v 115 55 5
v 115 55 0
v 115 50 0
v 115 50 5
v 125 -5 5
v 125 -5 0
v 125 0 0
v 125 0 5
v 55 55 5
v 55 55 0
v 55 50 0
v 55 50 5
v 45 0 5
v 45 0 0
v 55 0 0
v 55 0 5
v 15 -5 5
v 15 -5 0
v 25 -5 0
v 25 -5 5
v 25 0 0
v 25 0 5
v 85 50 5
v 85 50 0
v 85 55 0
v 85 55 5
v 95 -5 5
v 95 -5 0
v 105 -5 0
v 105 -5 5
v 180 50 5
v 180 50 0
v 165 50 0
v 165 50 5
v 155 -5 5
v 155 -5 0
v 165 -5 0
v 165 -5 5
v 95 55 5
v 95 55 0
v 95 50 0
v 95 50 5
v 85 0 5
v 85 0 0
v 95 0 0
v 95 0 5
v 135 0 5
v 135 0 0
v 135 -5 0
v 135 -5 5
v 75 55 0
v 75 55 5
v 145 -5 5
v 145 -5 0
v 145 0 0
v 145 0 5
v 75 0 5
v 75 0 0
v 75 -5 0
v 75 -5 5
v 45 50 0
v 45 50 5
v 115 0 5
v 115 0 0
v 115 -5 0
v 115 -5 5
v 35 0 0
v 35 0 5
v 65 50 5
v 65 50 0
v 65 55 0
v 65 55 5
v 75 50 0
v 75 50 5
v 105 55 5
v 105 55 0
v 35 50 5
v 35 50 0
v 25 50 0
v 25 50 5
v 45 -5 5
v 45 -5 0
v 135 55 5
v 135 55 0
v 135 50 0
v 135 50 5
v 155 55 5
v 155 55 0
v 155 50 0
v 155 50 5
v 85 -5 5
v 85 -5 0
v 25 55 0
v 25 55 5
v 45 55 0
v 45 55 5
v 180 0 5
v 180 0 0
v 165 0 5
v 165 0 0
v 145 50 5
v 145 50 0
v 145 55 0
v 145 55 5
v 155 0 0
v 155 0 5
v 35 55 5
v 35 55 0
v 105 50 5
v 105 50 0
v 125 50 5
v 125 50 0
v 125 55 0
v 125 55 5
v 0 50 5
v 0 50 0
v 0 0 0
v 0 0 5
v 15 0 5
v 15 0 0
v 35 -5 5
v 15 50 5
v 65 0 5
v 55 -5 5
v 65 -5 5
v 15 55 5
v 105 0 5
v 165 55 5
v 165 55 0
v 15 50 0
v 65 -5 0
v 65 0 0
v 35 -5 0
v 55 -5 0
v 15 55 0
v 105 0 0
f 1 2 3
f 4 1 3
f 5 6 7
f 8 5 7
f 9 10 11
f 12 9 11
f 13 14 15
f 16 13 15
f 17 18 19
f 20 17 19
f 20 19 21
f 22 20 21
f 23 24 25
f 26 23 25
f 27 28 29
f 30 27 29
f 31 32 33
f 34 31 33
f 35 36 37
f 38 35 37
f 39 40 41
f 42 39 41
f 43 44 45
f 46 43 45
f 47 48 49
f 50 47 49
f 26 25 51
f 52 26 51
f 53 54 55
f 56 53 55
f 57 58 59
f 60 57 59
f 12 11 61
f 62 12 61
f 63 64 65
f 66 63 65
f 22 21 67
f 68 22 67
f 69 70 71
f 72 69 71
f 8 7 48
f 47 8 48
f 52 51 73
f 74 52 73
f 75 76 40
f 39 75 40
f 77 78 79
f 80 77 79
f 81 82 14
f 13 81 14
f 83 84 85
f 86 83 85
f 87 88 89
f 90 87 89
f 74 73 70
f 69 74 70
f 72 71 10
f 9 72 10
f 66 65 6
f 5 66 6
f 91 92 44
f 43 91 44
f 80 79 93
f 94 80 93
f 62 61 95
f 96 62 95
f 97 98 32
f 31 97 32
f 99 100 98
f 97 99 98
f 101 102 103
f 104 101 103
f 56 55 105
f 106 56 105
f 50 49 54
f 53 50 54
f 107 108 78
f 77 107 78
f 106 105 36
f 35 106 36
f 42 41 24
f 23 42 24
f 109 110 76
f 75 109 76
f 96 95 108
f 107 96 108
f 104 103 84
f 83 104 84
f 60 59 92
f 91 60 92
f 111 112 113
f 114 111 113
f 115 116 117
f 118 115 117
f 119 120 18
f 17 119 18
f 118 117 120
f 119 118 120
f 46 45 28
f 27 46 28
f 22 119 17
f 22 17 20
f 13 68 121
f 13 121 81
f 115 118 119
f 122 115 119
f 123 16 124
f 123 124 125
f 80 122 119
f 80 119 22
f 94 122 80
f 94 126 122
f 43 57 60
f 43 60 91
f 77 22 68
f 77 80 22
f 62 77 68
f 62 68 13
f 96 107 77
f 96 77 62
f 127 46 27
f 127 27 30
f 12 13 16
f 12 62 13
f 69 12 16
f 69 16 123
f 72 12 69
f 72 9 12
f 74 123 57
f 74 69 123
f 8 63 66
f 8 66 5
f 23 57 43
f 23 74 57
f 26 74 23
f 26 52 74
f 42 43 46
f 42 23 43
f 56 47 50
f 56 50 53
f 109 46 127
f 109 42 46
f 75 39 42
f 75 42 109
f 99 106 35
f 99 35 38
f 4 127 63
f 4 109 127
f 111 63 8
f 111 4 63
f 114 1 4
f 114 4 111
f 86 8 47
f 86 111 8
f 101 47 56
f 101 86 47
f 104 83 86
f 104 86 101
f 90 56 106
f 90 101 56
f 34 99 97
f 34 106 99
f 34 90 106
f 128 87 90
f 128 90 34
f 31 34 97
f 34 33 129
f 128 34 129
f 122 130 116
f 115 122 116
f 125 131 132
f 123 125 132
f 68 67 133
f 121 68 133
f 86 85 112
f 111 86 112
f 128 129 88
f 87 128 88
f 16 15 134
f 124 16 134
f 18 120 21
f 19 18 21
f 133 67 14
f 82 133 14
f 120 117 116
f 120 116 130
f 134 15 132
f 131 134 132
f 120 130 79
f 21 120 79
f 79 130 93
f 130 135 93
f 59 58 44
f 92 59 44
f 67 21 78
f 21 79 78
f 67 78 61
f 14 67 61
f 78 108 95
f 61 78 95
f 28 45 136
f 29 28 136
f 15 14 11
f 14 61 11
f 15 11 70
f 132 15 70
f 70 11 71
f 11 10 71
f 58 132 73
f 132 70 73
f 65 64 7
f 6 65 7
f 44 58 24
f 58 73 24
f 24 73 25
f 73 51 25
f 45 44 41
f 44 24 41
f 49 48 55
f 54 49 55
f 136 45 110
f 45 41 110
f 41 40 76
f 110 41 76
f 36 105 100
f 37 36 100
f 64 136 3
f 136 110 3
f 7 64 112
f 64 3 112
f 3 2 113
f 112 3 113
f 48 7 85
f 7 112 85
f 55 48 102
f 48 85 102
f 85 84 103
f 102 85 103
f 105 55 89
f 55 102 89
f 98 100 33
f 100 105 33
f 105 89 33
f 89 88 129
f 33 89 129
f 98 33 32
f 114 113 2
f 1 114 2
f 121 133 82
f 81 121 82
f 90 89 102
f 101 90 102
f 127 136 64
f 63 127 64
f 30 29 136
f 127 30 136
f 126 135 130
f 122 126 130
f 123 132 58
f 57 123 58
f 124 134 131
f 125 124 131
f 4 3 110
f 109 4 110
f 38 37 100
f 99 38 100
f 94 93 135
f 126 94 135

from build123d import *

# Parameters (mm, degrees)
BOSS_EXTRUDE2_DEPTH = 5


with BuildPart() as part:
    # Sketch1 → Boss-Extrude2 (new body)
    with BuildSketch(Plane.XY):
        Polygon((0, 0), (15, 0), (15, -5), (25, -5), (25, 0), (35, 0), (35, -5), (45, -5), (45, 0), (55, 0), (55, -5), (65, -5), (65, 0), (75, 0), (75, -5), (85, -5), (85, 0), (95, 0), (95, -5), (105, -5), (105, 0), (115, 0), (115, -5), (125, -5), (125, 0), (135, 0), (135, -5), (145, -5), (145, 0), (155, 0), (155, -5), (165, -5), (165, 0), (180, 0), (180, 50), (165, 50), (165, 55), (155, 55), (155, 50), (145, 50), (145, 55), (135, 55), (135, 50), (125, 50), (125, 55), (115, 55), (115, 50), (105, 50), (105, 55), (95, 55), (95, 50), (85, 50), (85, 55), (75, 55), (75, 50), (65, 50), (65, 55), (55, 55), (55, 50), (45, 50), (45, 55), (35, 55), (35, 50), (25, 50), (25, 55), (15, 55), (15, 50), (0, 50), align=None)
    extrude(amount=BOSS_EXTRUDE2_DEPTH)


solid = part.part
